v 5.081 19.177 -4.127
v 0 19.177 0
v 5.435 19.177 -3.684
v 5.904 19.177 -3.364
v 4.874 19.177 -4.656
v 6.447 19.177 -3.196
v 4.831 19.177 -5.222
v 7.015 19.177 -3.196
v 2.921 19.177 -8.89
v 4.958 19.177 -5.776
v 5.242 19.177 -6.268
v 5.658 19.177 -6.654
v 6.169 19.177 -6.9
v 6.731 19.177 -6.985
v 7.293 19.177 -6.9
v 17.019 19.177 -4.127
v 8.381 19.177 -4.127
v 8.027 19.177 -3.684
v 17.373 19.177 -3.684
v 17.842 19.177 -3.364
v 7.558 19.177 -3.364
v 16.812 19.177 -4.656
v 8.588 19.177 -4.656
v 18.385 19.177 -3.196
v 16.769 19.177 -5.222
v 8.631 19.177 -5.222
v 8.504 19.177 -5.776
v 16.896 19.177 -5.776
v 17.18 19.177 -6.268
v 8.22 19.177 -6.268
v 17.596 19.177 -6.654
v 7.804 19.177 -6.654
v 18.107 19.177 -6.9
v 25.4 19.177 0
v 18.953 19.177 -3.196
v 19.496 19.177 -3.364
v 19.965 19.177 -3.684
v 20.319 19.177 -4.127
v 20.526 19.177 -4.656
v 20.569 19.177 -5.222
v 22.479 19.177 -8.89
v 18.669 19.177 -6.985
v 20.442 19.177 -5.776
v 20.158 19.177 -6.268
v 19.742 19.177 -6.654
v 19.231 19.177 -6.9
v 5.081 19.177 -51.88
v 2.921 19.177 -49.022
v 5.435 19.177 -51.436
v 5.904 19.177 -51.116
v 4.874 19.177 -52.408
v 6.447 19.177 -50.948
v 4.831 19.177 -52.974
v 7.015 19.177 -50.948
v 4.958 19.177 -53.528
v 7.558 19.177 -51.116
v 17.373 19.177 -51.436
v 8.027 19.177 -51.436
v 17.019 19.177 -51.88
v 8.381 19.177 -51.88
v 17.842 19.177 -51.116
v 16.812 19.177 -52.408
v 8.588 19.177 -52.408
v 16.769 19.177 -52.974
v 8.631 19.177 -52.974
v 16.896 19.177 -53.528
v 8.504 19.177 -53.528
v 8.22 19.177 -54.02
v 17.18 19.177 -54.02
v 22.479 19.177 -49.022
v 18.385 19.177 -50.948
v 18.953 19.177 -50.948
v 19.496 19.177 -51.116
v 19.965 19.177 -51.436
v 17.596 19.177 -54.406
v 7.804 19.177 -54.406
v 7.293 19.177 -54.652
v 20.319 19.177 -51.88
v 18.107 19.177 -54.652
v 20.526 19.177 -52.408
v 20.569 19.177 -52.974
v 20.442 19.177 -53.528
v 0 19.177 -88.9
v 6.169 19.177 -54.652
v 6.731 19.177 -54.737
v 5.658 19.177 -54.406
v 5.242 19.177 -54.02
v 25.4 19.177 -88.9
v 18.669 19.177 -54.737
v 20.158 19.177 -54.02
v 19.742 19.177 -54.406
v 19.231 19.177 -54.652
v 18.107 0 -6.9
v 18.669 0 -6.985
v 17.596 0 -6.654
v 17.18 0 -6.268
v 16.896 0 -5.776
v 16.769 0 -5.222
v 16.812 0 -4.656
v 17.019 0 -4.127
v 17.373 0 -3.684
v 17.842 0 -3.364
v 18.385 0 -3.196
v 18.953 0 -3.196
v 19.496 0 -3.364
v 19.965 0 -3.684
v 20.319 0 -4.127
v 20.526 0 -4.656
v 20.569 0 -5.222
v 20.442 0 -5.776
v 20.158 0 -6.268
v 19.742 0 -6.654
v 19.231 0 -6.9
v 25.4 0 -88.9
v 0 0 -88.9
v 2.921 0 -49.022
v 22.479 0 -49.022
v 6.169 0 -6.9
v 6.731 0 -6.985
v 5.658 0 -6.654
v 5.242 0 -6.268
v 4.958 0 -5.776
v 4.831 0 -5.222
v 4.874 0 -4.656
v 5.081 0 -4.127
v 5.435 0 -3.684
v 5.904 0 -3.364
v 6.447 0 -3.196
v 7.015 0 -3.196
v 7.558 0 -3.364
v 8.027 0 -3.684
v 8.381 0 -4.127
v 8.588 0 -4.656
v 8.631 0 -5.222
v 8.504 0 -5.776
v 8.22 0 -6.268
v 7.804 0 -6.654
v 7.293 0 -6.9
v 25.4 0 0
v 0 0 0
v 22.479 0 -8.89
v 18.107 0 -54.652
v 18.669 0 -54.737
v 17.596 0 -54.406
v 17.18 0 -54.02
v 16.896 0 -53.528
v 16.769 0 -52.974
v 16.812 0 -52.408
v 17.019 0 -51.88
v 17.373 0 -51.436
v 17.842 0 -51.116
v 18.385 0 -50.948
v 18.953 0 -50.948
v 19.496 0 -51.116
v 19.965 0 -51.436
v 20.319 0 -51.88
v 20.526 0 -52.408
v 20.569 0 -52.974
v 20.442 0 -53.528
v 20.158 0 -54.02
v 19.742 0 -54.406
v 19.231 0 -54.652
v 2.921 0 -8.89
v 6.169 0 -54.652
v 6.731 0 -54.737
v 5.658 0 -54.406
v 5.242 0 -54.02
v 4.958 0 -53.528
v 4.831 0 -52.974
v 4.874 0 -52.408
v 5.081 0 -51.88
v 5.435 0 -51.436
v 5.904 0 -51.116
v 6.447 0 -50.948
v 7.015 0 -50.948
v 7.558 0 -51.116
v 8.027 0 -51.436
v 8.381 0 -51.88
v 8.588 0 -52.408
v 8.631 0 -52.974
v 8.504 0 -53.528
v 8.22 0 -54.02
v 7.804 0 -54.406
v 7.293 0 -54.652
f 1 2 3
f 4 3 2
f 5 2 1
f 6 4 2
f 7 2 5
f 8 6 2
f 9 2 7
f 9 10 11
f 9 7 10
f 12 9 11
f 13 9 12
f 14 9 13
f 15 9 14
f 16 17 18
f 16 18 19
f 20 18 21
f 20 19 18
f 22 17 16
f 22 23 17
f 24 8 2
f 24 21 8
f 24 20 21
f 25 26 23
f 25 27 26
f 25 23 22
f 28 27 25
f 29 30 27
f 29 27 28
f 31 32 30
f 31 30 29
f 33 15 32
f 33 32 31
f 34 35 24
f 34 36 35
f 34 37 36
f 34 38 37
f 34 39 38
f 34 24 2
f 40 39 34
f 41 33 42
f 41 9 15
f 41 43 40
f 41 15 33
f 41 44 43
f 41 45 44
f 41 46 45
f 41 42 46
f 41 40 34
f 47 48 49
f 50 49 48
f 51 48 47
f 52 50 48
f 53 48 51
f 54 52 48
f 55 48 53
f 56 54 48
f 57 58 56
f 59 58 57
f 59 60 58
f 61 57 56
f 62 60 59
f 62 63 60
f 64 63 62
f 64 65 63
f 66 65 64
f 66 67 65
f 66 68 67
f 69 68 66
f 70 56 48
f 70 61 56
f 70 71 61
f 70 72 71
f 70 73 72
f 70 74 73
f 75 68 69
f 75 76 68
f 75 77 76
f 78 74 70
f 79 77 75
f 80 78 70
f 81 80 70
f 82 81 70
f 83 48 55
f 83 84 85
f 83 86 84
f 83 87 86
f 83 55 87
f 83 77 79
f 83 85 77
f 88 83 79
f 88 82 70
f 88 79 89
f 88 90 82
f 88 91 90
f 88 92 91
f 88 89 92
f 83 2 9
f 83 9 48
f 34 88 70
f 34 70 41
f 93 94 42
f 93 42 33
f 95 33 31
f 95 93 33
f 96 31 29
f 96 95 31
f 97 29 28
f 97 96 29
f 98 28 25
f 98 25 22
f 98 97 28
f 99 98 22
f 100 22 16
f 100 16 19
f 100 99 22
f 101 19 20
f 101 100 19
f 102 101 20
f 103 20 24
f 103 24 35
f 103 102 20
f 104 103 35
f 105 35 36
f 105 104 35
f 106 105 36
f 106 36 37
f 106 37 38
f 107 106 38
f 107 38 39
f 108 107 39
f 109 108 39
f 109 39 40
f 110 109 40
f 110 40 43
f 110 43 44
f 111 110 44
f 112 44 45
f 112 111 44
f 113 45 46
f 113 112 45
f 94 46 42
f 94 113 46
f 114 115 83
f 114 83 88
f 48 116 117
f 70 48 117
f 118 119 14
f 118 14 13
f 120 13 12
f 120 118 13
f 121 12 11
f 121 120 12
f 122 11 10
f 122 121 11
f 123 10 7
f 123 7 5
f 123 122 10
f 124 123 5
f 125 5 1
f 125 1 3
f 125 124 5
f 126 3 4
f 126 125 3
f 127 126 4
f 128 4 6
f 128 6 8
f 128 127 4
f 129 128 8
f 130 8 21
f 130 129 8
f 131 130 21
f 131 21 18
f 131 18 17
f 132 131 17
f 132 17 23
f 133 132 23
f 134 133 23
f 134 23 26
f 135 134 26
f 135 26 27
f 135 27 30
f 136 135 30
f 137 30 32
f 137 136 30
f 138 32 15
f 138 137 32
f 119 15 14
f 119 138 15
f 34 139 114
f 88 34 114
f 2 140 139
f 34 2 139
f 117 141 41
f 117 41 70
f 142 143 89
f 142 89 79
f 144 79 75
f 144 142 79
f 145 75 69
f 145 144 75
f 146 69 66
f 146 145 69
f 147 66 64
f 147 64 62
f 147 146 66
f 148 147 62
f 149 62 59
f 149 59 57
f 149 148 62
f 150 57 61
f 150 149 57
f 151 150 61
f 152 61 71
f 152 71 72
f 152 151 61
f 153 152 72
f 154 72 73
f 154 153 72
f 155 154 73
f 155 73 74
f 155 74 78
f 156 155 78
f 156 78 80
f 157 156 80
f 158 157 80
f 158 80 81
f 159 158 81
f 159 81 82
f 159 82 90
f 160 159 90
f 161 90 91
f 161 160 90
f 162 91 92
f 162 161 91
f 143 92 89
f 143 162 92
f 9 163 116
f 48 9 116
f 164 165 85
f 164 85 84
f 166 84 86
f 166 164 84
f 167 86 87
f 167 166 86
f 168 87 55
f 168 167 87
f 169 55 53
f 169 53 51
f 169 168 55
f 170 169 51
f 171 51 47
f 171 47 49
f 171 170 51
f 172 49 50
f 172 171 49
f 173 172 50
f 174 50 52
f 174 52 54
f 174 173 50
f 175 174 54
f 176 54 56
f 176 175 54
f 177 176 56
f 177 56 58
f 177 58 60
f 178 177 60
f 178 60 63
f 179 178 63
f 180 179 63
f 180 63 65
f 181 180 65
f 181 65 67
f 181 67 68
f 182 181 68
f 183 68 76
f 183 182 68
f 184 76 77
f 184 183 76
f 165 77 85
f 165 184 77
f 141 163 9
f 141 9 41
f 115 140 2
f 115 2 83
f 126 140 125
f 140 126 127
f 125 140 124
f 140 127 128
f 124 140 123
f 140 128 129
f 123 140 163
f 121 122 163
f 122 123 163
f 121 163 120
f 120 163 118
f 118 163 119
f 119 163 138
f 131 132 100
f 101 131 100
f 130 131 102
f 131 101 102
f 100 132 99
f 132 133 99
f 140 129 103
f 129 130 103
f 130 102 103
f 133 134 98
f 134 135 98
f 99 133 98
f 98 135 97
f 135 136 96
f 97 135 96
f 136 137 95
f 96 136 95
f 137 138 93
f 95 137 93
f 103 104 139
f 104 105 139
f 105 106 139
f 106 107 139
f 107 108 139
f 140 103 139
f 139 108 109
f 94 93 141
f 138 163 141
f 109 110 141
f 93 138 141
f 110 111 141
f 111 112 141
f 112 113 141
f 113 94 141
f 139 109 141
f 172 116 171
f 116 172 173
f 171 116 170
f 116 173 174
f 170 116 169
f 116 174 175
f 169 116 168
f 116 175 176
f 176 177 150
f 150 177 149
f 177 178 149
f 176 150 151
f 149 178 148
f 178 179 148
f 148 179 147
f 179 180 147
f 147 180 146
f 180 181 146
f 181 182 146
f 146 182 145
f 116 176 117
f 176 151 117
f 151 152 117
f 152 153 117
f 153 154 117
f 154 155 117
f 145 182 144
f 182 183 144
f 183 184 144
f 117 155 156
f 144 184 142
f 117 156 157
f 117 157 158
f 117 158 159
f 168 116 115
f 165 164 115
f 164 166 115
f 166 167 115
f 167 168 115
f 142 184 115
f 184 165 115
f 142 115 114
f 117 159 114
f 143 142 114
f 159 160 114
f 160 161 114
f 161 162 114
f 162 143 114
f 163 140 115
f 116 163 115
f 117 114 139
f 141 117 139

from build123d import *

# Parameters (mm, degrees)
SKETCH1_W           = 25.4
SKETCH1_H           = 88.9
SKETCH1_R           = 1.905
SKETCH1_W_2         = 19.558
SKETCH1_H_2         = 40.132
BOSS_EXTRUDE1_DEPTH = 19.177


with BuildPart() as part:
    # Sketch1 → Boss-Extrude1 (new body)
    with BuildSketch(Plane(origin=(0, 0, 0), x_dir=(1, 0, 0), z_dir=(0, 1, 0))):
        with Locations((12.7, 44.45)):
            Rectangle(SKETCH1_W, SKETCH1_H)
        with Locations(Location((6.731, 52.832, 0), (0, 0, 90))):
            Circle(SKETCH1_R, mode=Mode.SUBTRACT)
        with Locations(Location((18.669, 52.832, 0), (0, 0, 90))):
            Circle(SKETCH1_R, mode=Mode.SUBTRACT)
        with Locations(Location((6.731, 5.08, 0), (0, 0, 90))):
            Circle(SKETCH1_R, mode=Mode.SUBTRACT)
        with Locations(Location((18.669, 5.08, 0), (0, 0, 90))):
            Circle(SKETCH1_R, mode=Mode.SUBTRACT)
        with Locations((12.7, 28.956)):
            Rectangle(SKETCH1_W_2, SKETCH1_H_2, mode=Mode.SUBTRACT)
    extrude(amount=BOSS_EXTRUDE1_DEPTH)


solid = part.part
